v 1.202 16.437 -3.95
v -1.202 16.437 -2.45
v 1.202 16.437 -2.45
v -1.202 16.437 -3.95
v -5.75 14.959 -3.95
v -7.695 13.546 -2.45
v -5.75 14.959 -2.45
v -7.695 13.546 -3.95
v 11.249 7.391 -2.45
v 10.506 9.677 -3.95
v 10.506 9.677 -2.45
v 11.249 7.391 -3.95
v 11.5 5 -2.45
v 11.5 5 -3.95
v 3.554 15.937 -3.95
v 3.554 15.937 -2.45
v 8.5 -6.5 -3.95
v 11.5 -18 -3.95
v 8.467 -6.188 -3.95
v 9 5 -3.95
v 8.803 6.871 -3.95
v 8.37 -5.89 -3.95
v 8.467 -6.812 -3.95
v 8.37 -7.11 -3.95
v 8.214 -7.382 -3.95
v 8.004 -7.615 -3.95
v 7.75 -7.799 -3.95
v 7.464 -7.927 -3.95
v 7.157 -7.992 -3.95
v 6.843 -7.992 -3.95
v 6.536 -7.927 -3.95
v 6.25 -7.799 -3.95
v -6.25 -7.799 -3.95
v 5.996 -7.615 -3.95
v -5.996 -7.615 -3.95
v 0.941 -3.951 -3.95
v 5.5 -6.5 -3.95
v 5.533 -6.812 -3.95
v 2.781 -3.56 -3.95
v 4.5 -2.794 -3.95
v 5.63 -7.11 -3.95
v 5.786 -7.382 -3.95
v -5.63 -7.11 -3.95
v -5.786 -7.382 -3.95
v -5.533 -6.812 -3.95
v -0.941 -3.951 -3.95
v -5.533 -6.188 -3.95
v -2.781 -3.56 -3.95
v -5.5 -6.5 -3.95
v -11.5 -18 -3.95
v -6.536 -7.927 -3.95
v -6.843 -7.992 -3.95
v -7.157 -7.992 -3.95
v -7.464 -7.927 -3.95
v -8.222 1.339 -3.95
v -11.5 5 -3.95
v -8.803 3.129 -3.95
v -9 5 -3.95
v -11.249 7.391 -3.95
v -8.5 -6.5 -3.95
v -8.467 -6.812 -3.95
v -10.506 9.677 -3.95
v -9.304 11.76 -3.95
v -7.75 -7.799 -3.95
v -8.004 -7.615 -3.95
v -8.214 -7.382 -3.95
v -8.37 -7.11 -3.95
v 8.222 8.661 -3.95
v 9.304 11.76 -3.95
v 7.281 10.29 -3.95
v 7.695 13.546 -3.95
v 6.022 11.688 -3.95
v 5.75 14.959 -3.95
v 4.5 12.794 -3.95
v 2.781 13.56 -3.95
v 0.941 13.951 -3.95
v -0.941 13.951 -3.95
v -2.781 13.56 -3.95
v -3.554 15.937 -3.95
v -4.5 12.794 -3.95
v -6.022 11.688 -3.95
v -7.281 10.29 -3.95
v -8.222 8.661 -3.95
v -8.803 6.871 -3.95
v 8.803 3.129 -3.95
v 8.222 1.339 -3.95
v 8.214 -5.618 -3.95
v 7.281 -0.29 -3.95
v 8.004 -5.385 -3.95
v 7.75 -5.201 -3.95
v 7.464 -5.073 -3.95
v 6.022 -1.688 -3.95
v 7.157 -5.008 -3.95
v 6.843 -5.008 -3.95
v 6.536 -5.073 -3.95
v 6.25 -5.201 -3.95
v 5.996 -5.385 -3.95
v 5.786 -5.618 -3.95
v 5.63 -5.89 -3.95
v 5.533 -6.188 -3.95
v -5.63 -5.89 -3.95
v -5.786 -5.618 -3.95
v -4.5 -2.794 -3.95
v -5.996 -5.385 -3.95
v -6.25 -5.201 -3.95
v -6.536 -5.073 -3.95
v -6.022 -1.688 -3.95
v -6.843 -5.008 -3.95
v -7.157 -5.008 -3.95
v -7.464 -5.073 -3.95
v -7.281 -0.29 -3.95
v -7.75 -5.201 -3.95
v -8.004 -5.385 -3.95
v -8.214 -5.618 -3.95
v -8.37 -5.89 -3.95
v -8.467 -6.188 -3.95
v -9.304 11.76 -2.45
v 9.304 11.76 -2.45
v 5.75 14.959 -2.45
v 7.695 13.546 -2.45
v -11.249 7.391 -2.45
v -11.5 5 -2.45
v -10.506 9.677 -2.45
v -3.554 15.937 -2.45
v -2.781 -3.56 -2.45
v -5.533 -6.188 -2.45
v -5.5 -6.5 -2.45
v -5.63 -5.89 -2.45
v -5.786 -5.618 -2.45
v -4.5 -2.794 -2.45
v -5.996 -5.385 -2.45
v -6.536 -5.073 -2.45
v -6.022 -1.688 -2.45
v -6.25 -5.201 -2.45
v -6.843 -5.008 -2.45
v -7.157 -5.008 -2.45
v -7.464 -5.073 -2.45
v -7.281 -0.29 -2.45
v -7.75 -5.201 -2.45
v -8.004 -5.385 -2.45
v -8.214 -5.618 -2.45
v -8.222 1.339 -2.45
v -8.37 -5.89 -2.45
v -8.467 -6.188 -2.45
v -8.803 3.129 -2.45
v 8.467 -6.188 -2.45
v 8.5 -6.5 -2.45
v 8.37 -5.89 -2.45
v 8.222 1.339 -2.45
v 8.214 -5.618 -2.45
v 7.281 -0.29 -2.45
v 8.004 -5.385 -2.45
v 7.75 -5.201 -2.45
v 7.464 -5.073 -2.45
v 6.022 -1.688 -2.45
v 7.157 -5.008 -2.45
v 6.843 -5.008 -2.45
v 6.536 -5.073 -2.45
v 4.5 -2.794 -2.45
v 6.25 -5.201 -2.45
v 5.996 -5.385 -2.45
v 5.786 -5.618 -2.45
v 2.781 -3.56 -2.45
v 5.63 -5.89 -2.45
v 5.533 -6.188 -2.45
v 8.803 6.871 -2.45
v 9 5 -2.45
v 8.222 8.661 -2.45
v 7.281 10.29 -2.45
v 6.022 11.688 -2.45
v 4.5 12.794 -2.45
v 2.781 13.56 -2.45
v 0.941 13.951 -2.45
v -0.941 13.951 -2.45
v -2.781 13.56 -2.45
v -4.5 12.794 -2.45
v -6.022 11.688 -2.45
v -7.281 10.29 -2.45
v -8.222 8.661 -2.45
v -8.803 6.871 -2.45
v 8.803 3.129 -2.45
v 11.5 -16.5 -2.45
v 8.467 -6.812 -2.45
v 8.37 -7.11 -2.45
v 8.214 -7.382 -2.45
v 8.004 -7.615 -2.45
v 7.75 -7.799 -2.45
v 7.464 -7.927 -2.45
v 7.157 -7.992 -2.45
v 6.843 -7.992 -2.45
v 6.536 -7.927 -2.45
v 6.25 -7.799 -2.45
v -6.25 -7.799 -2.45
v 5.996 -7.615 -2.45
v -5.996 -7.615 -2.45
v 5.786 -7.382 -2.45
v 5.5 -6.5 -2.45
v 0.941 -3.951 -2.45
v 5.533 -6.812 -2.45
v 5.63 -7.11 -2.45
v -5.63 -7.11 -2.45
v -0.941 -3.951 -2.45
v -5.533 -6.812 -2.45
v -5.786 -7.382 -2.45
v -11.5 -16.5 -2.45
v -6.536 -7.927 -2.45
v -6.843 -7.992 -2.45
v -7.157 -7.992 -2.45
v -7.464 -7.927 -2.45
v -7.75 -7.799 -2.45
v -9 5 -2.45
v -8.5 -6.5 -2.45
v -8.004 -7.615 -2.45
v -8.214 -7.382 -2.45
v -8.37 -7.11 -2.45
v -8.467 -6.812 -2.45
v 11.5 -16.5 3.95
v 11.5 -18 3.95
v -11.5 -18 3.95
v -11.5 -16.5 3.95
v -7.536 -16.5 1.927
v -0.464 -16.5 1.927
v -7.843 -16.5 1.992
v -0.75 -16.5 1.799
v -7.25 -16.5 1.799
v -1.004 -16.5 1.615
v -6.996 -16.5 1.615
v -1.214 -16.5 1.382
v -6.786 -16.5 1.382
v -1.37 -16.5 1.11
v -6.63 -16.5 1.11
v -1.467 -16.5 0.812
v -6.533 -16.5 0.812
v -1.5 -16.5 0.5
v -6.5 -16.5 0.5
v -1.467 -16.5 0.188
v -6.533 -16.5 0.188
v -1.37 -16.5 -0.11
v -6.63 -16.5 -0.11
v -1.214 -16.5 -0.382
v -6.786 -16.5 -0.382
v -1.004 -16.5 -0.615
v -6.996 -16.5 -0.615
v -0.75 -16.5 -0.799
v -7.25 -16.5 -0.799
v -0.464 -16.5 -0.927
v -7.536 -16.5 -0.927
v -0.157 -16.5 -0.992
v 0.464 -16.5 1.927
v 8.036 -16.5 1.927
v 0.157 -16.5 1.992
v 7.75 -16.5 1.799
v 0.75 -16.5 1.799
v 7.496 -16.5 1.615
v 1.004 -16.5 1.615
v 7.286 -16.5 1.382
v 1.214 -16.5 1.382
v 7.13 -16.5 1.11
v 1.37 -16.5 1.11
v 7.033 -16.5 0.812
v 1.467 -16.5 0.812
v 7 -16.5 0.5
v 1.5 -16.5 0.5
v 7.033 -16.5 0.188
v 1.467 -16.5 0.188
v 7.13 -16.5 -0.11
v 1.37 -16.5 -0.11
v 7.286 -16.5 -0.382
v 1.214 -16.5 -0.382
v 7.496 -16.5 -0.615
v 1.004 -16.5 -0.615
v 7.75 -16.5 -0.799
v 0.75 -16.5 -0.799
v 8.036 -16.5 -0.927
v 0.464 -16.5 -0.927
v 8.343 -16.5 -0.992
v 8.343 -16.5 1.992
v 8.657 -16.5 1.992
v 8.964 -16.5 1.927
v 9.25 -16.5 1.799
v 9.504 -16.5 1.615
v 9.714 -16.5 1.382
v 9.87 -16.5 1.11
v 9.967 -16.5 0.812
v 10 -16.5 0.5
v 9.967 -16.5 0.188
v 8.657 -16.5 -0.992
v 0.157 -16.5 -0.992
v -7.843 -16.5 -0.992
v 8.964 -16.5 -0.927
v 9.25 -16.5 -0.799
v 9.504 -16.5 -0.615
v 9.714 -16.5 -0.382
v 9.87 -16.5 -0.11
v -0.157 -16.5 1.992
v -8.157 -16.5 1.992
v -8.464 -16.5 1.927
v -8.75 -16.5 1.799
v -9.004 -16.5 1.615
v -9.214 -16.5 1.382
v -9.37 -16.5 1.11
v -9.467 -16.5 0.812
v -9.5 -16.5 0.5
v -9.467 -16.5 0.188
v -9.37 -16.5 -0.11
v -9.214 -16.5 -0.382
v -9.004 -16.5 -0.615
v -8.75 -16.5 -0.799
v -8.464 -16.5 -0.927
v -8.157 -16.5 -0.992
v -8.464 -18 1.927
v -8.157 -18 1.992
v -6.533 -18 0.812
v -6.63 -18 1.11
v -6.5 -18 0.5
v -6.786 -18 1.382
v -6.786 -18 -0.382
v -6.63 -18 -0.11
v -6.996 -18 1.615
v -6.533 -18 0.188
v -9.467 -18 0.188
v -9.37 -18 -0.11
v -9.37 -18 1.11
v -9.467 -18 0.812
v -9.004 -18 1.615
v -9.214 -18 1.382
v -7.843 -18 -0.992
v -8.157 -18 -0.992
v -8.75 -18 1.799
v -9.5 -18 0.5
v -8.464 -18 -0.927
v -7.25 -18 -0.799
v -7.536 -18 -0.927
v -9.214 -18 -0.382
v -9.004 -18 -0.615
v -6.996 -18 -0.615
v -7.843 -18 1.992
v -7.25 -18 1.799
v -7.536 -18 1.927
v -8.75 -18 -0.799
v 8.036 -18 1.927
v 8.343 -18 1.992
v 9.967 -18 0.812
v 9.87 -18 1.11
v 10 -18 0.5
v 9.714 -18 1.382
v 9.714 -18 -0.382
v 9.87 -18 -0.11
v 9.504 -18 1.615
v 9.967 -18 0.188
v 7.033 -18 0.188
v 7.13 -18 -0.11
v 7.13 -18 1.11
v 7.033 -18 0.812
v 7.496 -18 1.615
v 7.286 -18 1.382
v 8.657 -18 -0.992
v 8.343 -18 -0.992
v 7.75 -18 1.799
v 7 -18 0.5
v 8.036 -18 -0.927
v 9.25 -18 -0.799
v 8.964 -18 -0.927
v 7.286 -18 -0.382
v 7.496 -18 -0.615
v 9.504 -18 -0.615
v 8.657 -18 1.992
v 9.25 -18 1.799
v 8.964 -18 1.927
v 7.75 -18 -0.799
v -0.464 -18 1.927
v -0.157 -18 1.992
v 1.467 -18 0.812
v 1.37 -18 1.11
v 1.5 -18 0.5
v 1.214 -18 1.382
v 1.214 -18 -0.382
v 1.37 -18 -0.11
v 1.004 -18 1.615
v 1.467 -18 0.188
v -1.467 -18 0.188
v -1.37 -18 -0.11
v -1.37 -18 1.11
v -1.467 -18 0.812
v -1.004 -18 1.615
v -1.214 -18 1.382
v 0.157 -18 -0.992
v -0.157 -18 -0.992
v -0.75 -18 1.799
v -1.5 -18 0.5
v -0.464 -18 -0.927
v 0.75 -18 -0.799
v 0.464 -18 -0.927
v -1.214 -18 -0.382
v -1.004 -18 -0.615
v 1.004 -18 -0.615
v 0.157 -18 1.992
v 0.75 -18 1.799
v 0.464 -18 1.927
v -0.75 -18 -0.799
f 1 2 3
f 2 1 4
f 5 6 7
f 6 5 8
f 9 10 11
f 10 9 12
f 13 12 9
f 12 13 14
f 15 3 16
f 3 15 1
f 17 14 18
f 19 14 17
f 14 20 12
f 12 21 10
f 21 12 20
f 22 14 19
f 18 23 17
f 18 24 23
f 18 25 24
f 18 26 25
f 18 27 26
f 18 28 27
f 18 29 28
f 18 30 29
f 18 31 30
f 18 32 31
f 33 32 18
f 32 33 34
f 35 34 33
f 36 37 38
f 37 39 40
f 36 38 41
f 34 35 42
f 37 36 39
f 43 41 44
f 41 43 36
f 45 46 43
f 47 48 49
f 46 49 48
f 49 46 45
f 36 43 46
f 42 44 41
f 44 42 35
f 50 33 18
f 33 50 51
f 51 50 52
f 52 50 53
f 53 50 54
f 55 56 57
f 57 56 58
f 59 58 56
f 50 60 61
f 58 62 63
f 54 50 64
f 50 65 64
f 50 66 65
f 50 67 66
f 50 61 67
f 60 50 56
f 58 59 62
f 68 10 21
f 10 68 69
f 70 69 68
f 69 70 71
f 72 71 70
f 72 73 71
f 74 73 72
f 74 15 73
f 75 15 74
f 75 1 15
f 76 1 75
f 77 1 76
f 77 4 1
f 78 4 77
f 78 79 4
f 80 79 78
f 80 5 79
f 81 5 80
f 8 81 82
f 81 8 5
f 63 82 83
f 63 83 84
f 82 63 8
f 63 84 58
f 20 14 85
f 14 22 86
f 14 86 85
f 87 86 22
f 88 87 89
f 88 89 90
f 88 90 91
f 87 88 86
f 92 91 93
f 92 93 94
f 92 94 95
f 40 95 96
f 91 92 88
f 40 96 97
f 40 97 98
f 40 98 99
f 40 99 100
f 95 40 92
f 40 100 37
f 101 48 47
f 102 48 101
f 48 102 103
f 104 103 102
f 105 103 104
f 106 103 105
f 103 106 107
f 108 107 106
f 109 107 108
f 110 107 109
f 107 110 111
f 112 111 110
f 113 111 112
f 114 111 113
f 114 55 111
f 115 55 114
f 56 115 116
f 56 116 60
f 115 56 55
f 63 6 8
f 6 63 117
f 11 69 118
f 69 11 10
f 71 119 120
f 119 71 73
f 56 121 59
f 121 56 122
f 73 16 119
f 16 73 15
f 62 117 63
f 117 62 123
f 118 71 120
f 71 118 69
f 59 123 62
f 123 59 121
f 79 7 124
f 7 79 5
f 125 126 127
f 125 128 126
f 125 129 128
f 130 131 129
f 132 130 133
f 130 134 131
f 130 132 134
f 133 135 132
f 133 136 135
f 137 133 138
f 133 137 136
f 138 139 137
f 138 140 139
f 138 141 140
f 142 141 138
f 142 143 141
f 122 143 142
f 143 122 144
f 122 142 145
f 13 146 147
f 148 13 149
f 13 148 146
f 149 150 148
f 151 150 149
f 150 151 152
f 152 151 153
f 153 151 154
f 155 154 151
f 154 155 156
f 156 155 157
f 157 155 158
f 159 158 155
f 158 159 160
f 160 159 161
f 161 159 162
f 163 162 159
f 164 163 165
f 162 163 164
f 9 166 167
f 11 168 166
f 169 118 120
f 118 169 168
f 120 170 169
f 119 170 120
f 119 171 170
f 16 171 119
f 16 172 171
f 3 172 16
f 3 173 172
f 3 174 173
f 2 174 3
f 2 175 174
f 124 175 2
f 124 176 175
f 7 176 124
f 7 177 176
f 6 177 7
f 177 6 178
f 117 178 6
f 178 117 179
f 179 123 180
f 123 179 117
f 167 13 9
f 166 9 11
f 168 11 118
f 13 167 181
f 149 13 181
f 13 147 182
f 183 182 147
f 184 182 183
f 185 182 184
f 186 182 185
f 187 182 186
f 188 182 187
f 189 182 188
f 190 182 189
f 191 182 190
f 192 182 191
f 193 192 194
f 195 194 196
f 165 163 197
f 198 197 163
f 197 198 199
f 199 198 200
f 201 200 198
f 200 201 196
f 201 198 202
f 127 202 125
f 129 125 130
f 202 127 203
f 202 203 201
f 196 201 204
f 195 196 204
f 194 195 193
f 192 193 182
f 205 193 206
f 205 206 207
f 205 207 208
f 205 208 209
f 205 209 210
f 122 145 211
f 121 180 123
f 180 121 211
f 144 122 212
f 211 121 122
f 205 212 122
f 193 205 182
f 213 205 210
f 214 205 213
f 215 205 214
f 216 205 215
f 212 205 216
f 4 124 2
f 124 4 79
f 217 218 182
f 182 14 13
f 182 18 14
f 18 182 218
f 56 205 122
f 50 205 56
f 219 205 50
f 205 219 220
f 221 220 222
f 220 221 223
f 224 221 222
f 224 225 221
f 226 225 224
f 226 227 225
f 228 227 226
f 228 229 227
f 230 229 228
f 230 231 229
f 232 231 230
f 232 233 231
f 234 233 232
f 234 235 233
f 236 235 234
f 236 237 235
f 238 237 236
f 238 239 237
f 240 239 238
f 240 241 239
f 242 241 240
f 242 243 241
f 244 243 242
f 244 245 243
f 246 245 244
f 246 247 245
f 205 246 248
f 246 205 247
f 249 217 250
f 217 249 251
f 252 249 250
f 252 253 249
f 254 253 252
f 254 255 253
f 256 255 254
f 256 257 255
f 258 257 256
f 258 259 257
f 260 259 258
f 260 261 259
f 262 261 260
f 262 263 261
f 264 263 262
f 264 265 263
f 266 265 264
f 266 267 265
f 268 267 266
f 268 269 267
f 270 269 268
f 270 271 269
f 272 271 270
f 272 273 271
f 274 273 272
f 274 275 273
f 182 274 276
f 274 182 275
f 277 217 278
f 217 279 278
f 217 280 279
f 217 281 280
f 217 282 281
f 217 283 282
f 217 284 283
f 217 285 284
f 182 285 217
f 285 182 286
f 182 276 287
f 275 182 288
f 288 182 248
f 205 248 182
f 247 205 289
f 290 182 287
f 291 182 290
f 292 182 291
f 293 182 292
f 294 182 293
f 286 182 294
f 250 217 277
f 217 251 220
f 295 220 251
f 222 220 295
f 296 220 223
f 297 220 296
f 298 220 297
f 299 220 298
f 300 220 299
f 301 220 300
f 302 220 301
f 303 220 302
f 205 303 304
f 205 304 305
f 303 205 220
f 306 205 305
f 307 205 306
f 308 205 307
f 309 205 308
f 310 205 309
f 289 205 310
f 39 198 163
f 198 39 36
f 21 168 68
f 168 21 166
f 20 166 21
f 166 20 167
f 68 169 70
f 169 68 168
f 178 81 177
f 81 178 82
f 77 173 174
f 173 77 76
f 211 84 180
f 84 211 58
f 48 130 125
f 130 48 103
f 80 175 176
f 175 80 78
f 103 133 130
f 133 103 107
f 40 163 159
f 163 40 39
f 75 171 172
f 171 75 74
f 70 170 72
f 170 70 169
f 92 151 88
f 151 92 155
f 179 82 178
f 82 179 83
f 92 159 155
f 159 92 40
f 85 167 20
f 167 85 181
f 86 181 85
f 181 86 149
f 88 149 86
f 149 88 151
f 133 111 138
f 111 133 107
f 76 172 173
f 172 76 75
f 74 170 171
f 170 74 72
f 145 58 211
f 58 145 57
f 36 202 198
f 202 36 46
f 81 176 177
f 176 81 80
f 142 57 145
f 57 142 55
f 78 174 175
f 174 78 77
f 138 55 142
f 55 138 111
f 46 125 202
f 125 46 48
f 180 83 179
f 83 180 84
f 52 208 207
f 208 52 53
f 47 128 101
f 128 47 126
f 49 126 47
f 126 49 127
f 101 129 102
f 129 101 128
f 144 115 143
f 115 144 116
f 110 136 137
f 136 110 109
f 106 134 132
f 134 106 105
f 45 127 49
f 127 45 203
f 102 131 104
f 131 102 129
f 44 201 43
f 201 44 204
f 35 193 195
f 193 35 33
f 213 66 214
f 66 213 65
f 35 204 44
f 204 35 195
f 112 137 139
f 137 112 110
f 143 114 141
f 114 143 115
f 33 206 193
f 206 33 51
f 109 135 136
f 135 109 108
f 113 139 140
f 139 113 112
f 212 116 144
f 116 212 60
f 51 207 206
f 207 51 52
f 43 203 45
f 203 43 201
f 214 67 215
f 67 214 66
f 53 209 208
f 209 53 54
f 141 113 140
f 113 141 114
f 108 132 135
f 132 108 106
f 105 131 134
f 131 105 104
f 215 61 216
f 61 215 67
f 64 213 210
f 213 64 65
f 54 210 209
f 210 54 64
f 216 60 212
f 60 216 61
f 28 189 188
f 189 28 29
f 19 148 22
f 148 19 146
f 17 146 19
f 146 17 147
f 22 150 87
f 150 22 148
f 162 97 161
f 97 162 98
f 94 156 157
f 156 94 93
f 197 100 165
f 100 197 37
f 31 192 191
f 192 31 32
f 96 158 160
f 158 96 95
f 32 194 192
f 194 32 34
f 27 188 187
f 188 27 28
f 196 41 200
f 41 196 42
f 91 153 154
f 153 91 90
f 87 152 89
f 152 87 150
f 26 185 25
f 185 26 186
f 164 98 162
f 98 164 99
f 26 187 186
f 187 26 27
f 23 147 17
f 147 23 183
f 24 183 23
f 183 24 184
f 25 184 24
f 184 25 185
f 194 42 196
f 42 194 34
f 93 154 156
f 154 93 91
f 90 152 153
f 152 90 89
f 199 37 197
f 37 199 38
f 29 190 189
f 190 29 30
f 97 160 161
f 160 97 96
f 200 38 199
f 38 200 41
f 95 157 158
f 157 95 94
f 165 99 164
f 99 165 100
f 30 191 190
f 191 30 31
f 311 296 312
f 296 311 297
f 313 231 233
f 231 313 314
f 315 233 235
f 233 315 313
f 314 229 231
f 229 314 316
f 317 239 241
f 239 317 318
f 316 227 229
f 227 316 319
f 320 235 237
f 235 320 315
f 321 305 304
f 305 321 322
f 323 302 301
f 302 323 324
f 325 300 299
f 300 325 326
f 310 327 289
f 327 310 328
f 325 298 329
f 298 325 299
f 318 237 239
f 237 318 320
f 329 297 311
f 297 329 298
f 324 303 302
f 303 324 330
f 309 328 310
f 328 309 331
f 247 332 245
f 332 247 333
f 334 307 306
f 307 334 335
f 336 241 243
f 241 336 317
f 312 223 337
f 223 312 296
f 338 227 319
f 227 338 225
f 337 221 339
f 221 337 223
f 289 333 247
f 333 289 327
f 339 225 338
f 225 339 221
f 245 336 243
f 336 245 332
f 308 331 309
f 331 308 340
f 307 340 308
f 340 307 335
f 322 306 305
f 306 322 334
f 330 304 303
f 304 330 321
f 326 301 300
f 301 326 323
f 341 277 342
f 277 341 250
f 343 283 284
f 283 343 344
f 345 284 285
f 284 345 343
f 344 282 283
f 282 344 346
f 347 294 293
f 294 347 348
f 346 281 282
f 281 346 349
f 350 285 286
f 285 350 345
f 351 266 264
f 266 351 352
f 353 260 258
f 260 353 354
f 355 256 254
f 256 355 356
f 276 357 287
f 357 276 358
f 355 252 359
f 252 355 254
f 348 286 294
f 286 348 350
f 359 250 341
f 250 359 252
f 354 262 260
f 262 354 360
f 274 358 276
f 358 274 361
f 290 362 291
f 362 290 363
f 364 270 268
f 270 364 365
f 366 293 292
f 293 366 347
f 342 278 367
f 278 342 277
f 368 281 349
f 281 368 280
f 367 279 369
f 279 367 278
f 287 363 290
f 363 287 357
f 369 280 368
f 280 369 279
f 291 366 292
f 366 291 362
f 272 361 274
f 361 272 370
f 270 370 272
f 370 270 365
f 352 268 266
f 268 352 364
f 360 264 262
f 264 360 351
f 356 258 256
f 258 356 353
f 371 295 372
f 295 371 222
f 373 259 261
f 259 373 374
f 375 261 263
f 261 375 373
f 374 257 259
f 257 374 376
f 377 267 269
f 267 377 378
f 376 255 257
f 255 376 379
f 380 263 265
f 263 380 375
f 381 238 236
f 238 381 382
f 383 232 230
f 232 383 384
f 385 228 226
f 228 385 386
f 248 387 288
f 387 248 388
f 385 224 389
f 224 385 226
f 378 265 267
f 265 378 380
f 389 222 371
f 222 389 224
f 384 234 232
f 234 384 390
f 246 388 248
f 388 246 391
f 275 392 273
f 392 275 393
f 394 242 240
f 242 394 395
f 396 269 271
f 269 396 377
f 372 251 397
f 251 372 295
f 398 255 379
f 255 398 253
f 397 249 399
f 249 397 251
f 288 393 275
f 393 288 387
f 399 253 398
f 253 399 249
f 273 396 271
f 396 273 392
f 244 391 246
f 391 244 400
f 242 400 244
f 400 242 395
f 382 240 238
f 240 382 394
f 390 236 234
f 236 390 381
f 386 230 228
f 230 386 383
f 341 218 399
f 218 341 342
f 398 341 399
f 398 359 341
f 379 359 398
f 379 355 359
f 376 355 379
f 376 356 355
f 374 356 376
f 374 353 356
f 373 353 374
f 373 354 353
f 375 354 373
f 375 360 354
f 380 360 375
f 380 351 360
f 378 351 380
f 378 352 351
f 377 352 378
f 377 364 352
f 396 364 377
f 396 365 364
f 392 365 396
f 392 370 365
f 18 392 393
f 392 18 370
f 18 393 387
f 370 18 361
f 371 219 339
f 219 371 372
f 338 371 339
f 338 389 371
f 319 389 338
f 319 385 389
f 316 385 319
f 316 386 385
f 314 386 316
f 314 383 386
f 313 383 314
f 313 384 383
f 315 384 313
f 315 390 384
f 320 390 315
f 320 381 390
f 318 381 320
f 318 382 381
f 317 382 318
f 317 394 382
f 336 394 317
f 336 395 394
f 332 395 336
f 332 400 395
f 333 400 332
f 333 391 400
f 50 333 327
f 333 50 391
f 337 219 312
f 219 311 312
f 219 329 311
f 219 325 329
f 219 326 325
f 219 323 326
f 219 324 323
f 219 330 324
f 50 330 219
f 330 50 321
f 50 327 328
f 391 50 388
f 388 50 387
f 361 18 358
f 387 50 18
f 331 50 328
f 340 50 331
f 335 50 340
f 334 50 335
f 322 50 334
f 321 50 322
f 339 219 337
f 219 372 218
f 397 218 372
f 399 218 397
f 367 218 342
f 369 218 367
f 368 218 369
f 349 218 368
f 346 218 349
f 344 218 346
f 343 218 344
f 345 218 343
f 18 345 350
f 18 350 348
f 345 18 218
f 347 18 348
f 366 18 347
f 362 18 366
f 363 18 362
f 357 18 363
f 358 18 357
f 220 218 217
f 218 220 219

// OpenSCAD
// -*-C-*-
// Model for 2WD turtle robot IR sensor mounting bracket.
//
// This bracket is part of the "Turtle - 2WD Mobile Platform"
// manufactured by DFRobot and featured in the book "Make an Arduino-
// Controlled Robot" by Michael Margolis.
//
// Copyright 2013 Brian Davis
//
// License: LGPL 2.1 or later

module robot_platform_loop_bracket() {
  color("black")
  // Center the model.
  translate([0, -16.5, -3.95])
    union() {
      difference() {
        union() {
          // Rounded upper portion of main bracket body.
          translate([0, 21.5, 0])
            cylinder(r=11.5, h=1.5);
          // Rectangular lower portion of main bracket body.
          translate([-11.5, 0, 0])
            cube([23, 21.5, 1.5]);
        }
        union() {
          // Main loop hole.
          translate([0, 21.5, -1])
            cylinder(r=9, h=3);
          // Left mounting hole.
          translate([-7, 10, -1])
            cylinder(r=1.5, h=3);
          // Bottom mounting hole.
          translate([7, 10, -1])
            cylinder(r=1.5, h=3);
        }
      }
      // Perpindicular bottom mount point.
      // NOTE: forward edge is rounded.
      translate([-11.5, 0, 0])
        rotate([90, 0, 0])
          difference() {
            cube([23, 7.9, 1.5]);
            union() {
              // Left bottom mounting hole.
              translate([3.5, 4.45, -1])
                cylinder(r=1.5, h=3);
              // Right bottom mounting hole.
              translate([20, 4.45, -1])
                cylinder(r=1.5, h=3);
              // Center bottom mounting hole.
              translate([11.5, 4.45, -1])
                cylinder(r=1.5, h=3);
            }
          }
      }
}

// Test renders.
$fn=30;

robot_platform_loop_bracket();
